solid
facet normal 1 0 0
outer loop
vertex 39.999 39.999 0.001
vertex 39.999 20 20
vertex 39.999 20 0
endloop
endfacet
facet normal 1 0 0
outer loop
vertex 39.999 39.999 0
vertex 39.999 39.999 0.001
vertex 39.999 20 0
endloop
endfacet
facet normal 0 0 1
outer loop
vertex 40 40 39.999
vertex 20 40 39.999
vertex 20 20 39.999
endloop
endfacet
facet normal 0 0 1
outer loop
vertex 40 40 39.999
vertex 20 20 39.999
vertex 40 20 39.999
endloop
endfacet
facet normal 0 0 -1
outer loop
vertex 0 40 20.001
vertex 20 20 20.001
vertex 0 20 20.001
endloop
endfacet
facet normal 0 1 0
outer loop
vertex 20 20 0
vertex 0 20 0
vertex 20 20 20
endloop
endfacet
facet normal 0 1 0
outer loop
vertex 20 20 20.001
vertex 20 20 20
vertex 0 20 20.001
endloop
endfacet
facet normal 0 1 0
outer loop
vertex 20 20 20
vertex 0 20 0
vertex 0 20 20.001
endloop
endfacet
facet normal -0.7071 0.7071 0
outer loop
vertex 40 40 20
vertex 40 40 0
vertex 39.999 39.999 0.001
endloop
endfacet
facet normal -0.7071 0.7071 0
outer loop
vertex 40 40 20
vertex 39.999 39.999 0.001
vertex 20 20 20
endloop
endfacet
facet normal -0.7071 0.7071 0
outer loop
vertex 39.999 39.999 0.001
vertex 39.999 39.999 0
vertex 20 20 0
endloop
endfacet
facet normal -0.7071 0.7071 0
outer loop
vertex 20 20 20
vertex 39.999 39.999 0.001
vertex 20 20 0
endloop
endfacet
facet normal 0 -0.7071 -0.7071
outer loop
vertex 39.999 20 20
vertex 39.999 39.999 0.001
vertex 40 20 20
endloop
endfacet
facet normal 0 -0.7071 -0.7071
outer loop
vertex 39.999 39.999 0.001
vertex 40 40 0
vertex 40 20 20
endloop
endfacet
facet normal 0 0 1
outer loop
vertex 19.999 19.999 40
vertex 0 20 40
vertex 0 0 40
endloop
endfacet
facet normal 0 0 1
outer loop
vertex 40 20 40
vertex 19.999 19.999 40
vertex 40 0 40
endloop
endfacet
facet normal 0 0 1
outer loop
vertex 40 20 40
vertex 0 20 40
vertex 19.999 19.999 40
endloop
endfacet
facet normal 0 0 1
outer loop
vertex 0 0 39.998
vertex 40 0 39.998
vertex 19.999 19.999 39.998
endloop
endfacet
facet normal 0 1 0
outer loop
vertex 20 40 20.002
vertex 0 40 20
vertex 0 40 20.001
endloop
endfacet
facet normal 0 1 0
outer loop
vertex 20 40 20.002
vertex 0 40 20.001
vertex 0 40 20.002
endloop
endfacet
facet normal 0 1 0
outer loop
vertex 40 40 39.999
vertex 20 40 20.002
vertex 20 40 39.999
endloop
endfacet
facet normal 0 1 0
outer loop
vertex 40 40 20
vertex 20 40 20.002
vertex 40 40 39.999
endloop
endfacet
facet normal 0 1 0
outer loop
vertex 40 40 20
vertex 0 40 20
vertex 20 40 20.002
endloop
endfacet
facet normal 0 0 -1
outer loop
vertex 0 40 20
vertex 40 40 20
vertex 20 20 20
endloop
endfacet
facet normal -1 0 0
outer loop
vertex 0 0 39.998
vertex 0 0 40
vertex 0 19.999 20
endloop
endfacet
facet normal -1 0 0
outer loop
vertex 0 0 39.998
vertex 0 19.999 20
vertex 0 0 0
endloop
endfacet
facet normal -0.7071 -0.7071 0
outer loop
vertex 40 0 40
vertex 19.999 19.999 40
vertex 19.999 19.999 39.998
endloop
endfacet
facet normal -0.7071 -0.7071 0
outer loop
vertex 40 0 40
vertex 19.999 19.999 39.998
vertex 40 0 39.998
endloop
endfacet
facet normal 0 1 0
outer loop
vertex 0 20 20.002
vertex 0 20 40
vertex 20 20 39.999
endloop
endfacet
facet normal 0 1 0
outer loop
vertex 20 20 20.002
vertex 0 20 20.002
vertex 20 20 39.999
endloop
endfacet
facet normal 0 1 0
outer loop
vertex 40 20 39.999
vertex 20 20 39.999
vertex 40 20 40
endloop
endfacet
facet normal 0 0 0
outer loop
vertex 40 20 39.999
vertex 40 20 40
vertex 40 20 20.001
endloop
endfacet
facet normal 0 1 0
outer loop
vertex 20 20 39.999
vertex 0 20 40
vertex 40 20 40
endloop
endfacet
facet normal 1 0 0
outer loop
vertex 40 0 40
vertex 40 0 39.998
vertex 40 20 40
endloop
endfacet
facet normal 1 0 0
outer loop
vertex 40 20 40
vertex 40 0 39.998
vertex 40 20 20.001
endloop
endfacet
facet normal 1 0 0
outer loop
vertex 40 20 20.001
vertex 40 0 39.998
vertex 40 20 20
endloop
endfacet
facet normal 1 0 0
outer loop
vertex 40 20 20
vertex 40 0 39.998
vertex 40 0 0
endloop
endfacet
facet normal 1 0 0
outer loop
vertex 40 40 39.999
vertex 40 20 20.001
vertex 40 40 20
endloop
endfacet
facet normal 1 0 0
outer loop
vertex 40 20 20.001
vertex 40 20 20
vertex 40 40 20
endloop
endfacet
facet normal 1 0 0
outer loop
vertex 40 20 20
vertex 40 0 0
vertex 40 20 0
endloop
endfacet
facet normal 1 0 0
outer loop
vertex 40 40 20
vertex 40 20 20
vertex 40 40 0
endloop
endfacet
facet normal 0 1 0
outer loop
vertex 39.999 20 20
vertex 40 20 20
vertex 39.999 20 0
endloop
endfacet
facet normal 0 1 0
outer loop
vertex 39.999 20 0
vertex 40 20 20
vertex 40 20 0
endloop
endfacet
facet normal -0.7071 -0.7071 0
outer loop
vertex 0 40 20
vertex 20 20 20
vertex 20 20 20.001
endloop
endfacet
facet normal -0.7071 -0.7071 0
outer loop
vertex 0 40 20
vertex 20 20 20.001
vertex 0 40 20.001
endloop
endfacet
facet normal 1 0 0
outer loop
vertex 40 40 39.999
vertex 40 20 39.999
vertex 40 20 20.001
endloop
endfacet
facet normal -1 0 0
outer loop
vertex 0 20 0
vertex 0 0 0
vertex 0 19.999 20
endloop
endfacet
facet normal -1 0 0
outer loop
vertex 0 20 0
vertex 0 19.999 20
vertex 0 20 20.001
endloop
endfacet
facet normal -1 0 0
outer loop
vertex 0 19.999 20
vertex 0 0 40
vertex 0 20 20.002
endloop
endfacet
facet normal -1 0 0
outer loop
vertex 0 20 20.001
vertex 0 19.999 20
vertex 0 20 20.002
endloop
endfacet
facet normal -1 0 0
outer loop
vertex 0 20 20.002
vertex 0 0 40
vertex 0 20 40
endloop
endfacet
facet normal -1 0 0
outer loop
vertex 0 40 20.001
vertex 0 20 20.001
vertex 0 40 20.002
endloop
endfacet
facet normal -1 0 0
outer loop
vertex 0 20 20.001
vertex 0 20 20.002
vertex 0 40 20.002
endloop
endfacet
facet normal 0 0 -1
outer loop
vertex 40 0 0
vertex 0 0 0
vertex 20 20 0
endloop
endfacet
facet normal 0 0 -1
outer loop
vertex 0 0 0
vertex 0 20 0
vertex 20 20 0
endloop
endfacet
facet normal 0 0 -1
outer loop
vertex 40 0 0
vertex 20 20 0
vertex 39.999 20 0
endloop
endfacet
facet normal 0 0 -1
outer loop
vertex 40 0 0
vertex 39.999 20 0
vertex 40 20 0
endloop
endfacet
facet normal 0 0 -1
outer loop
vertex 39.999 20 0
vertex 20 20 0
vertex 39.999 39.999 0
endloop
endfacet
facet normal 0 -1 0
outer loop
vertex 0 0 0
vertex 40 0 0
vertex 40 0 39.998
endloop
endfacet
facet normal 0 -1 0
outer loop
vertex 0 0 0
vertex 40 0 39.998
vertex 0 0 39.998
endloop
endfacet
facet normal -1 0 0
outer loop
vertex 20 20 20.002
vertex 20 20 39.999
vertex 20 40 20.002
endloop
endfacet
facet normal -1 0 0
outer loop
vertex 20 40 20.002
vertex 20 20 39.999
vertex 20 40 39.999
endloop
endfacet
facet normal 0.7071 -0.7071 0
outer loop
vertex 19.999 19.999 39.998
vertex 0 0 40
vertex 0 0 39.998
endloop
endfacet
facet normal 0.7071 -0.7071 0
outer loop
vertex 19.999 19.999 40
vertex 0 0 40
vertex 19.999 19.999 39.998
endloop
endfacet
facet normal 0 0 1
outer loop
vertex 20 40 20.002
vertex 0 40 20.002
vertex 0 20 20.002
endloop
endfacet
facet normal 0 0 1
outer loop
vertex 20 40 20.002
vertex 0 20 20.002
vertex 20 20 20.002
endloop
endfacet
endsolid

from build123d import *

# Parameters (mm, degrees)
SKETCH1_W           = 40
SKETCH1_H           = 40
BOSS_EXTRUDE1_DEPTH = 40
SKETCH2_W           = 20
SKETCH2_H           = 20
CUT_EXTRUDE1_DEPTH  = 20
SKETCH3_W           = 20
SKETCH3_H           = 20
CUT_EXTRUDE2_DEPTH  = 10
CUT_EXTRUDE7_DEPTH  = 10
SKETCH8_W           = 20
SKETCH8_H           = 20
BOSS_EXTRUDE2_DEPTH = 10
CUT_EXTRUDE8_DEPTH  = 10
SKETCH10_W          = 20
SKETCH10_H          = 20
CUT_EXTRUDE9_DEPTH  = 5
CUT_EXTRUDE13_DEPTH = 10
SKETCH13_W          = 20
SKETCH13_H          = 20
CUT_EXTRUDE15_DEPTH = 20
CUT_EXTRUDE16_DEPTH = 0.001
CUT_EXTRUDE21_DEPTH = 0.001
SKETCH17_W          = 20
SKETCH17_H          = 20
BOSS_EXTRUDE5_DEPTH = 14.999
CUT_EXTRUDE23_DEPTH = 0.0001
BOSS_EXTRUDE6_DEPTH = 0.0001
SKETCH21_W          = 20
SKETCH21_H          = 20
CUT_EXTRUDE25_DEPTH = 9.998
BOSS_EXTRUDE7_DEPTH = 9.998
CUT_EXTRUDE26_DEPTH = 0.0001


with BuildPart() as part:
    # Sketch1 → Boss-Extrude1 (new body)
    with BuildSketch(Plane.XY):
        with Locations((20, 20)):
            Rectangle(SKETCH1_W, SKETCH1_H)
    extrude(amount=BOSS_EXTRUDE1_DEPTH)

    # Sketch2 → Cut-Extrude1 (cut)
    with BuildSketch(Plane.XY.offset(40)):
        with Locations((30, 30)):
            Rectangle(SKETCH2_W, SKETCH2_H)
    extrude(amount=-CUT_EXTRUDE1_DEPTH, mode=Mode.SUBTRACT)

    # Sketch3 → Cut-Extrude2 (cut)
    with BuildSketch(Plane.XY.offset(40)):
        with Locations((10, 30)):
            Rectangle(SKETCH3_W, SKETCH3_H)
    extrude(amount=-CUT_EXTRUDE2_DEPTH, mode=Mode.SUBTRACT)

    # Sketch7 → Cut-Extrude7 (cut)
    with BuildSketch(Plane(origin=(0, 0, 0), x_dir=(-1, 0, 0), z_dir=(0, 0, -1))):
        Polygon((-40, 40), (-20, 20), (0, 40), align=None)
    extrude(amount=-CUT_EXTRUDE7_DEPTH, mode=Mode.SUBTRACT)

    # Sketch8 → Boss-Extrude2 (add)
    with BuildSketch(Plane.XY.offset(20)):
        with Locations((30, 30)):
            Rectangle(SKETCH8_W, SKETCH8_H)
    extrude(amount=BOSS_EXTRUDE2_DEPTH)

    # Sketch9 → Cut-Extrude8 (cut)
    with BuildSketch(Plane(origin=(0, 0, 10), x_dir=(-1, 0, 0), z_dir=(0, 0, -1))):
        Polygon((-40, 40), (-20, 20), (0, 40), align=None)
    extrude(amount=-CUT_EXTRUDE8_DEPTH, mode=Mode.SUBTRACT)

    # Sketch10 → Cut-Extrude9 (cut)
    with BuildSketch(Plane.XY.offset(30)):
        with Locations((30, 30)):
            Rectangle(SKETCH10_W, SKETCH10_H)
    extrude(amount=-CUT_EXTRUDE9_DEPTH, mode=Mode.SUBTRACT)

    # Sketch12 → Cut-Extrude13 (cut)
    with BuildSketch(Plane.XY.offset(40)):
        Polygon((0, 0), (19.999, 19.999), (40, 0), align=None)
    extrude(amount=-CUT_EXTRUDE13_DEPTH, mode=Mode.SUBTRACT)

    # Sketch13 → Cut-Extrude15 (cut)
    with BuildSketch(Plane.ZY):
        with Locations((10, 30)):
            Rectangle(SKETCH13_W, SKETCH13_H)
    extrude(amount=-CUT_EXTRUDE15_DEPTH, mode=Mode.SUBTRACT)

    # Sketch14 → Cut-Extrude16 (cut)
    with BuildSketch(Plane(origin=(0, 0, 20), x_dir=(-1, 0, 0), z_dir=(0, 0, -1))):
        Polygon((-20, 20), (0, 40), (0, 20), align=None)
    extrude(amount=-CUT_EXTRUDE16_DEPTH, mode=Mode.SUBTRACT)

    # Sketch16 → Cut-Extrude21 (cut)
    with BuildSketch(Plane(origin=(40, 0, 0), x_dir=(0, 0, -1), z_dir=(1, 0, 0))):
        Polygon((0, 40), (-20, 20), (0, 20), align=None)
    extrude(amount=-CUT_EXTRUDE21_DEPTH, mode=Mode.SUBTRACT)

    # Sketch17 → Boss-Extrude5 (add)
    with BuildSketch(Plane.XY.offset(25)):
        with Locations((30, 30)):
            Rectangle(SKETCH17_W, SKETCH17_H)
    extrude(amount=BOSS_EXTRUDE5_DEPTH)

    # Sketch18 → Cut-Extrude23 (cut)
    with BuildSketch(Plane(origin=(40, 0, 0), x_dir=(0, 0, -1), z_dir=(1, 0, 0))):
        Polygon((-40, 20), (-20.001, 20), (-39.999, 40), align=None)
    extrude(amount=-CUT_EXTRUDE23_DEPTH, mode=Mode.SUBTRACT)

    # Sketch20 → Boss-Extrude6 (add)
    with BuildSketch(Plane(origin=(0, 0, 20.001), x_dir=(-1, 0, 0), z_dir=(0, 0, -1))):
        Polygon((-20, 20), (0, 20), (0, 40), align=None)
    extrude(amount=BOSS_EXTRUDE6_DEPTH)

    # Sketch21 → Cut-Extrude25 (cut)
    with BuildSketch(Plane.XY.offset(30)):
        with Locations((10, 30)):
            Rectangle(SKETCH21_W, SKETCH21_H)
    extrude(amount=-CUT_EXTRUDE25_DEPTH, mode=Mode.SUBTRACT)

    # Sketch22 → Boss-Extrude7 (add)
    with BuildSketch(Plane.XY.offset(30)):
        Polygon((0, 0), (20, 20), (40, 0), align=None)
    extrude(amount=BOSS_EXTRUDE7_DEPTH)

    # Sketch23 → Cut-Extrude26 (cut)
    with BuildSketch(Plane.ZY):
        Polygon((0, 0), (20, 19.999), (40, 0), align=None)
    extrude(amount=-CUT_EXTRUDE26_DEPTH, mode=Mode.SUBTRACT)


solid = part.part
